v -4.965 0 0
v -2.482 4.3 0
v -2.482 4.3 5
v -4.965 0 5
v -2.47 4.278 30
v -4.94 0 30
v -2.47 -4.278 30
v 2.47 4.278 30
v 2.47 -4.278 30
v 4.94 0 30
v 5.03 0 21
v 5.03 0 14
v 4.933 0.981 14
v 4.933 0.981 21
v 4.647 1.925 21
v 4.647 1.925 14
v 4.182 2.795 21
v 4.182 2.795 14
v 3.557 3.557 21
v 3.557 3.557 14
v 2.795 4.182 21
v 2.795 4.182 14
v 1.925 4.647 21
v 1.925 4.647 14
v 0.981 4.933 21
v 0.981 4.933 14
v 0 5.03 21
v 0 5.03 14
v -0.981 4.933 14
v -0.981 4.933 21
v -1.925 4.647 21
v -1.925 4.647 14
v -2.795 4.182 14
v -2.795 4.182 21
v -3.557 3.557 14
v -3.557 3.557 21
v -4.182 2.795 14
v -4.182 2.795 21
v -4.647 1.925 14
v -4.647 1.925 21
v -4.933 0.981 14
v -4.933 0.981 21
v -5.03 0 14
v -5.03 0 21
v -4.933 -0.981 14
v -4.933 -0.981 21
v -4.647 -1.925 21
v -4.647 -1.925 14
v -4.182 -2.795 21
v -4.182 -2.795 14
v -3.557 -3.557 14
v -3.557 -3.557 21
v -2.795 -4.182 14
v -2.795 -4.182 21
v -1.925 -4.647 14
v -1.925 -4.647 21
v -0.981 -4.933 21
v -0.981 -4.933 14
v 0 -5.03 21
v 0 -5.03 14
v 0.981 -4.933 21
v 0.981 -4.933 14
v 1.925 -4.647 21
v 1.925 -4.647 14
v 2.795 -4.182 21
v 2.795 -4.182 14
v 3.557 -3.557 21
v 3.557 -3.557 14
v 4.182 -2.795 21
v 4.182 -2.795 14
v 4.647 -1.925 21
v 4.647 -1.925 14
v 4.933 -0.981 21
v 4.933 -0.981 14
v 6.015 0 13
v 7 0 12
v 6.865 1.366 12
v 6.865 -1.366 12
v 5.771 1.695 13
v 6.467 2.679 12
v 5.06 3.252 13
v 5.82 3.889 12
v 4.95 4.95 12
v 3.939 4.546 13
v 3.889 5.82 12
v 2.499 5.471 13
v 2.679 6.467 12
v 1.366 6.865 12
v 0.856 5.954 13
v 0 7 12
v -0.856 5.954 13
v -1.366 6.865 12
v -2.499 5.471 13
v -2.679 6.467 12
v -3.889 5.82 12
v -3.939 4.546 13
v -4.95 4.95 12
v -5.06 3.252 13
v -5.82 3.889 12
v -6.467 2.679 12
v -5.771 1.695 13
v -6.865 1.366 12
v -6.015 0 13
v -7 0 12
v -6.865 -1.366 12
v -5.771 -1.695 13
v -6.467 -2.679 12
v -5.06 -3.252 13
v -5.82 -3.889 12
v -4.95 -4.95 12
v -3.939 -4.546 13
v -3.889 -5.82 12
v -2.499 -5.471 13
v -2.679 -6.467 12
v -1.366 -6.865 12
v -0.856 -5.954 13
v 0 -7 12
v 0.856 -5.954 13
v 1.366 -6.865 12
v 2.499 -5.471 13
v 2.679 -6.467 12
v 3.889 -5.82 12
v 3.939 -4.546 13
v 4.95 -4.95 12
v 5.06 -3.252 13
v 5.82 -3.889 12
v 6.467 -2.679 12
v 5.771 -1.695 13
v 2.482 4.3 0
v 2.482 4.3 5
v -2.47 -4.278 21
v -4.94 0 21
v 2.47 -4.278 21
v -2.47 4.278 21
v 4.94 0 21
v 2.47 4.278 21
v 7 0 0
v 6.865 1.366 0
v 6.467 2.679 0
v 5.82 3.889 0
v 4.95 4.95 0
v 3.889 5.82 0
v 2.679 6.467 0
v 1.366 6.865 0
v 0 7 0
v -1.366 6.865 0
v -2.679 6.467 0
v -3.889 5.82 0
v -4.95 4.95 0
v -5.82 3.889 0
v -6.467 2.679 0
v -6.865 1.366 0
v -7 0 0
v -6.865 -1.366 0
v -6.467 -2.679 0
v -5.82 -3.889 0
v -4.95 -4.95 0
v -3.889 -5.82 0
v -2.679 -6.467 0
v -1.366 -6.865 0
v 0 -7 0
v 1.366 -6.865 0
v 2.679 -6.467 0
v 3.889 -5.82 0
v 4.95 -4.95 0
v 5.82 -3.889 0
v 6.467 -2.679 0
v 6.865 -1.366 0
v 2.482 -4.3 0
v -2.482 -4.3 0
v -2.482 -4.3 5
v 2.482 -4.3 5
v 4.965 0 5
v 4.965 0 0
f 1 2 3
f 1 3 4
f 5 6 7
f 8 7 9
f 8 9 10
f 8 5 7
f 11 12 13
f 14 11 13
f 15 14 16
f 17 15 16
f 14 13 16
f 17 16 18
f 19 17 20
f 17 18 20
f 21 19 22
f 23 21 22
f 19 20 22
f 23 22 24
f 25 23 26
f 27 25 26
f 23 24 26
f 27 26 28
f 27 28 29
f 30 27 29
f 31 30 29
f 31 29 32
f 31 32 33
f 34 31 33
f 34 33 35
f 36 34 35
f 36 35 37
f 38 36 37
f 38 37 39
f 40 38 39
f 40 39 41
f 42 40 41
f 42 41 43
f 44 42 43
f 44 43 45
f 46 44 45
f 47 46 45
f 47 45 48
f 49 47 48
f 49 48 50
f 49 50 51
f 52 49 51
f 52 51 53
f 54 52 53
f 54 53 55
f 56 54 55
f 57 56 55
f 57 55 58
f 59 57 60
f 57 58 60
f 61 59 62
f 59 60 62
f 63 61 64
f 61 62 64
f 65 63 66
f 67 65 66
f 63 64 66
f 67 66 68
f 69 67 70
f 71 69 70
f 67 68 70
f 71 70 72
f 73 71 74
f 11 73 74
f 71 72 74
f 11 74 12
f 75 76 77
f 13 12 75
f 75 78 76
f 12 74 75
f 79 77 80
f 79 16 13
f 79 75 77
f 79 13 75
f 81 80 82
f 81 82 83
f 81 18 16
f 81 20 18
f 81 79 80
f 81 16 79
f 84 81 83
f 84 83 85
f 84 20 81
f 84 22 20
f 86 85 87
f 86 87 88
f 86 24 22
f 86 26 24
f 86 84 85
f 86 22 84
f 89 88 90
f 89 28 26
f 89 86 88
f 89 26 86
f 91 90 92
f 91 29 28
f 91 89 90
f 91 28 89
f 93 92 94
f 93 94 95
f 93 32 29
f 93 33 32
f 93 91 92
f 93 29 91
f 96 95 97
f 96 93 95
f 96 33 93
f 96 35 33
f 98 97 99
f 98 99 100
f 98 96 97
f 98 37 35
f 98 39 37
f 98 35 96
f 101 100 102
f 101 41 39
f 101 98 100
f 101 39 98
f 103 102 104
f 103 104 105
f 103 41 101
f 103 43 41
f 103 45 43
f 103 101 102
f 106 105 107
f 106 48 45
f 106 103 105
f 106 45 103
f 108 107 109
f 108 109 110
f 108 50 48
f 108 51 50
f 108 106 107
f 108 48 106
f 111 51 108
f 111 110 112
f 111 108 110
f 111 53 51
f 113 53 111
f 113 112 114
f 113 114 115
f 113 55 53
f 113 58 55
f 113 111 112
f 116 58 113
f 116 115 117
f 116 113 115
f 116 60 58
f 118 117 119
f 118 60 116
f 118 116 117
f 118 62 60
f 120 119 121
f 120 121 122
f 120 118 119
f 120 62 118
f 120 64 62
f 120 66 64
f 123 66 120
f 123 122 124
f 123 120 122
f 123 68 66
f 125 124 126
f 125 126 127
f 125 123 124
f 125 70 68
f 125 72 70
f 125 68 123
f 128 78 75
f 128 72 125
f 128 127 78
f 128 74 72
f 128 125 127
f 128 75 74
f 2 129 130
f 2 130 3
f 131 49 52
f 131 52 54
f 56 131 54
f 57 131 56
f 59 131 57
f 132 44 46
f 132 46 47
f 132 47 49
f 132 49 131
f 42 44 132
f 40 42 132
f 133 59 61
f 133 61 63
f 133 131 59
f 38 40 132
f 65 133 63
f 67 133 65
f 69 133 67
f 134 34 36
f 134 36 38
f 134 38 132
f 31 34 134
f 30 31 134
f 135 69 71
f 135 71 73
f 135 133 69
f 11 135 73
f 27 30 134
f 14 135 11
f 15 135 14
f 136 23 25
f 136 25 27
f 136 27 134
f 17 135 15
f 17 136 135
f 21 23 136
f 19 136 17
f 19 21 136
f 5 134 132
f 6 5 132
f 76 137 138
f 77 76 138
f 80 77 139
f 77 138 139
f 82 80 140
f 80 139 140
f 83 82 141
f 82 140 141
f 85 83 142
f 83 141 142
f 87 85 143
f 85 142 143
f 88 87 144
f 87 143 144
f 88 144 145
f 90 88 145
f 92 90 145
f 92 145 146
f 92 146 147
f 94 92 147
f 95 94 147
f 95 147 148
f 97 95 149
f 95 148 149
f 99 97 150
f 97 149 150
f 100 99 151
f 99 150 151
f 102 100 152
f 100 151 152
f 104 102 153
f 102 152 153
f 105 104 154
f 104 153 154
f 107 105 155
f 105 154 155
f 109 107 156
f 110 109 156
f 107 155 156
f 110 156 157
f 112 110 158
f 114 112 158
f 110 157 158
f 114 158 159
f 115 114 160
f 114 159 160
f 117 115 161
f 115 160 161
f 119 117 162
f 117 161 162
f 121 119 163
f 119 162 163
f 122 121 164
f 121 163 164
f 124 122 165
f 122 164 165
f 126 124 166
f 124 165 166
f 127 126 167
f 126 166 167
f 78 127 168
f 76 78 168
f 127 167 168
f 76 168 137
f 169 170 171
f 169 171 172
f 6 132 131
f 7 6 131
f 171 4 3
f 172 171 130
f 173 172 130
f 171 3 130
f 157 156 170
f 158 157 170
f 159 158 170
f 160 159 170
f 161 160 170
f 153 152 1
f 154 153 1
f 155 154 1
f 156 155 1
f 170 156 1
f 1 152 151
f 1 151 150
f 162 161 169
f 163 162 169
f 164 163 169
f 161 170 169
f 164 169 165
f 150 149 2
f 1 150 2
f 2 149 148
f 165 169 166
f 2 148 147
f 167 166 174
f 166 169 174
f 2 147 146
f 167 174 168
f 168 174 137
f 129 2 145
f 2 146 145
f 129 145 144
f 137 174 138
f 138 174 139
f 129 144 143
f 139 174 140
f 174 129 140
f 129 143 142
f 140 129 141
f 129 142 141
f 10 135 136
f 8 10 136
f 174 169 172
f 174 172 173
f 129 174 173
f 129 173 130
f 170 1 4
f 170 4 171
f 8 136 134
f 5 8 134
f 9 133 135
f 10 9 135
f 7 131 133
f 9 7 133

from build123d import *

# Parameters (mm, degrees)
SKETCH031_R     = 7
PAD023_DEPTH    = 12
SKETCH033_R     = 5.03
PAD024_DEPTH    = 21
PAD025_DEPTH    = 30
POCKET005_DEPTH = 5


with BuildPart() as part:
    # Sketch031 → Pad023 (new body)
    with BuildSketch(Plane.XY):
        Circle(SKETCH031_R)
    extrude(amount=PAD023_DEPTH)

    # Sketch033 → Pad024 (join)
    with BuildSketch(Plane.XY):
        Circle(SKETCH033_R)
    extrude(amount=PAD024_DEPTH)

    # Sketch034 → Pad025 (join)
    with BuildSketch(Plane.XY):
        Polygon((4.94, 0), (2.47, 4.278165), (-2.47, 4.278165), (-4.94, 0), (-2.47, -4.278165), (2.47, -4.278165), align=None)
    extrude(amount=PAD025_DEPTH)

    # Sketch032 → Pocket005 (cut)
    with BuildSketch(Plane.XY):
        Polygon((4.965, 0), (2.4825, 4.299816), (-2.4825, 4.299816), (-4.965, 0), (-2.4825, -4.299816), (2.4825, -4.299816), align=None)
    extrude(amount=POCKET005_DEPTH, mode=Mode.SUBTRACT)

    # Sketch035 → Revolution007 (revolve)
    with BuildSketch(Plane.XZ):
        Polygon((5.03, 12), (7, 12), (5.03, 14), align=None)
    revolve(axis=Axis((0, 0, 0), (0, 0, 1)))


solid = part.part
